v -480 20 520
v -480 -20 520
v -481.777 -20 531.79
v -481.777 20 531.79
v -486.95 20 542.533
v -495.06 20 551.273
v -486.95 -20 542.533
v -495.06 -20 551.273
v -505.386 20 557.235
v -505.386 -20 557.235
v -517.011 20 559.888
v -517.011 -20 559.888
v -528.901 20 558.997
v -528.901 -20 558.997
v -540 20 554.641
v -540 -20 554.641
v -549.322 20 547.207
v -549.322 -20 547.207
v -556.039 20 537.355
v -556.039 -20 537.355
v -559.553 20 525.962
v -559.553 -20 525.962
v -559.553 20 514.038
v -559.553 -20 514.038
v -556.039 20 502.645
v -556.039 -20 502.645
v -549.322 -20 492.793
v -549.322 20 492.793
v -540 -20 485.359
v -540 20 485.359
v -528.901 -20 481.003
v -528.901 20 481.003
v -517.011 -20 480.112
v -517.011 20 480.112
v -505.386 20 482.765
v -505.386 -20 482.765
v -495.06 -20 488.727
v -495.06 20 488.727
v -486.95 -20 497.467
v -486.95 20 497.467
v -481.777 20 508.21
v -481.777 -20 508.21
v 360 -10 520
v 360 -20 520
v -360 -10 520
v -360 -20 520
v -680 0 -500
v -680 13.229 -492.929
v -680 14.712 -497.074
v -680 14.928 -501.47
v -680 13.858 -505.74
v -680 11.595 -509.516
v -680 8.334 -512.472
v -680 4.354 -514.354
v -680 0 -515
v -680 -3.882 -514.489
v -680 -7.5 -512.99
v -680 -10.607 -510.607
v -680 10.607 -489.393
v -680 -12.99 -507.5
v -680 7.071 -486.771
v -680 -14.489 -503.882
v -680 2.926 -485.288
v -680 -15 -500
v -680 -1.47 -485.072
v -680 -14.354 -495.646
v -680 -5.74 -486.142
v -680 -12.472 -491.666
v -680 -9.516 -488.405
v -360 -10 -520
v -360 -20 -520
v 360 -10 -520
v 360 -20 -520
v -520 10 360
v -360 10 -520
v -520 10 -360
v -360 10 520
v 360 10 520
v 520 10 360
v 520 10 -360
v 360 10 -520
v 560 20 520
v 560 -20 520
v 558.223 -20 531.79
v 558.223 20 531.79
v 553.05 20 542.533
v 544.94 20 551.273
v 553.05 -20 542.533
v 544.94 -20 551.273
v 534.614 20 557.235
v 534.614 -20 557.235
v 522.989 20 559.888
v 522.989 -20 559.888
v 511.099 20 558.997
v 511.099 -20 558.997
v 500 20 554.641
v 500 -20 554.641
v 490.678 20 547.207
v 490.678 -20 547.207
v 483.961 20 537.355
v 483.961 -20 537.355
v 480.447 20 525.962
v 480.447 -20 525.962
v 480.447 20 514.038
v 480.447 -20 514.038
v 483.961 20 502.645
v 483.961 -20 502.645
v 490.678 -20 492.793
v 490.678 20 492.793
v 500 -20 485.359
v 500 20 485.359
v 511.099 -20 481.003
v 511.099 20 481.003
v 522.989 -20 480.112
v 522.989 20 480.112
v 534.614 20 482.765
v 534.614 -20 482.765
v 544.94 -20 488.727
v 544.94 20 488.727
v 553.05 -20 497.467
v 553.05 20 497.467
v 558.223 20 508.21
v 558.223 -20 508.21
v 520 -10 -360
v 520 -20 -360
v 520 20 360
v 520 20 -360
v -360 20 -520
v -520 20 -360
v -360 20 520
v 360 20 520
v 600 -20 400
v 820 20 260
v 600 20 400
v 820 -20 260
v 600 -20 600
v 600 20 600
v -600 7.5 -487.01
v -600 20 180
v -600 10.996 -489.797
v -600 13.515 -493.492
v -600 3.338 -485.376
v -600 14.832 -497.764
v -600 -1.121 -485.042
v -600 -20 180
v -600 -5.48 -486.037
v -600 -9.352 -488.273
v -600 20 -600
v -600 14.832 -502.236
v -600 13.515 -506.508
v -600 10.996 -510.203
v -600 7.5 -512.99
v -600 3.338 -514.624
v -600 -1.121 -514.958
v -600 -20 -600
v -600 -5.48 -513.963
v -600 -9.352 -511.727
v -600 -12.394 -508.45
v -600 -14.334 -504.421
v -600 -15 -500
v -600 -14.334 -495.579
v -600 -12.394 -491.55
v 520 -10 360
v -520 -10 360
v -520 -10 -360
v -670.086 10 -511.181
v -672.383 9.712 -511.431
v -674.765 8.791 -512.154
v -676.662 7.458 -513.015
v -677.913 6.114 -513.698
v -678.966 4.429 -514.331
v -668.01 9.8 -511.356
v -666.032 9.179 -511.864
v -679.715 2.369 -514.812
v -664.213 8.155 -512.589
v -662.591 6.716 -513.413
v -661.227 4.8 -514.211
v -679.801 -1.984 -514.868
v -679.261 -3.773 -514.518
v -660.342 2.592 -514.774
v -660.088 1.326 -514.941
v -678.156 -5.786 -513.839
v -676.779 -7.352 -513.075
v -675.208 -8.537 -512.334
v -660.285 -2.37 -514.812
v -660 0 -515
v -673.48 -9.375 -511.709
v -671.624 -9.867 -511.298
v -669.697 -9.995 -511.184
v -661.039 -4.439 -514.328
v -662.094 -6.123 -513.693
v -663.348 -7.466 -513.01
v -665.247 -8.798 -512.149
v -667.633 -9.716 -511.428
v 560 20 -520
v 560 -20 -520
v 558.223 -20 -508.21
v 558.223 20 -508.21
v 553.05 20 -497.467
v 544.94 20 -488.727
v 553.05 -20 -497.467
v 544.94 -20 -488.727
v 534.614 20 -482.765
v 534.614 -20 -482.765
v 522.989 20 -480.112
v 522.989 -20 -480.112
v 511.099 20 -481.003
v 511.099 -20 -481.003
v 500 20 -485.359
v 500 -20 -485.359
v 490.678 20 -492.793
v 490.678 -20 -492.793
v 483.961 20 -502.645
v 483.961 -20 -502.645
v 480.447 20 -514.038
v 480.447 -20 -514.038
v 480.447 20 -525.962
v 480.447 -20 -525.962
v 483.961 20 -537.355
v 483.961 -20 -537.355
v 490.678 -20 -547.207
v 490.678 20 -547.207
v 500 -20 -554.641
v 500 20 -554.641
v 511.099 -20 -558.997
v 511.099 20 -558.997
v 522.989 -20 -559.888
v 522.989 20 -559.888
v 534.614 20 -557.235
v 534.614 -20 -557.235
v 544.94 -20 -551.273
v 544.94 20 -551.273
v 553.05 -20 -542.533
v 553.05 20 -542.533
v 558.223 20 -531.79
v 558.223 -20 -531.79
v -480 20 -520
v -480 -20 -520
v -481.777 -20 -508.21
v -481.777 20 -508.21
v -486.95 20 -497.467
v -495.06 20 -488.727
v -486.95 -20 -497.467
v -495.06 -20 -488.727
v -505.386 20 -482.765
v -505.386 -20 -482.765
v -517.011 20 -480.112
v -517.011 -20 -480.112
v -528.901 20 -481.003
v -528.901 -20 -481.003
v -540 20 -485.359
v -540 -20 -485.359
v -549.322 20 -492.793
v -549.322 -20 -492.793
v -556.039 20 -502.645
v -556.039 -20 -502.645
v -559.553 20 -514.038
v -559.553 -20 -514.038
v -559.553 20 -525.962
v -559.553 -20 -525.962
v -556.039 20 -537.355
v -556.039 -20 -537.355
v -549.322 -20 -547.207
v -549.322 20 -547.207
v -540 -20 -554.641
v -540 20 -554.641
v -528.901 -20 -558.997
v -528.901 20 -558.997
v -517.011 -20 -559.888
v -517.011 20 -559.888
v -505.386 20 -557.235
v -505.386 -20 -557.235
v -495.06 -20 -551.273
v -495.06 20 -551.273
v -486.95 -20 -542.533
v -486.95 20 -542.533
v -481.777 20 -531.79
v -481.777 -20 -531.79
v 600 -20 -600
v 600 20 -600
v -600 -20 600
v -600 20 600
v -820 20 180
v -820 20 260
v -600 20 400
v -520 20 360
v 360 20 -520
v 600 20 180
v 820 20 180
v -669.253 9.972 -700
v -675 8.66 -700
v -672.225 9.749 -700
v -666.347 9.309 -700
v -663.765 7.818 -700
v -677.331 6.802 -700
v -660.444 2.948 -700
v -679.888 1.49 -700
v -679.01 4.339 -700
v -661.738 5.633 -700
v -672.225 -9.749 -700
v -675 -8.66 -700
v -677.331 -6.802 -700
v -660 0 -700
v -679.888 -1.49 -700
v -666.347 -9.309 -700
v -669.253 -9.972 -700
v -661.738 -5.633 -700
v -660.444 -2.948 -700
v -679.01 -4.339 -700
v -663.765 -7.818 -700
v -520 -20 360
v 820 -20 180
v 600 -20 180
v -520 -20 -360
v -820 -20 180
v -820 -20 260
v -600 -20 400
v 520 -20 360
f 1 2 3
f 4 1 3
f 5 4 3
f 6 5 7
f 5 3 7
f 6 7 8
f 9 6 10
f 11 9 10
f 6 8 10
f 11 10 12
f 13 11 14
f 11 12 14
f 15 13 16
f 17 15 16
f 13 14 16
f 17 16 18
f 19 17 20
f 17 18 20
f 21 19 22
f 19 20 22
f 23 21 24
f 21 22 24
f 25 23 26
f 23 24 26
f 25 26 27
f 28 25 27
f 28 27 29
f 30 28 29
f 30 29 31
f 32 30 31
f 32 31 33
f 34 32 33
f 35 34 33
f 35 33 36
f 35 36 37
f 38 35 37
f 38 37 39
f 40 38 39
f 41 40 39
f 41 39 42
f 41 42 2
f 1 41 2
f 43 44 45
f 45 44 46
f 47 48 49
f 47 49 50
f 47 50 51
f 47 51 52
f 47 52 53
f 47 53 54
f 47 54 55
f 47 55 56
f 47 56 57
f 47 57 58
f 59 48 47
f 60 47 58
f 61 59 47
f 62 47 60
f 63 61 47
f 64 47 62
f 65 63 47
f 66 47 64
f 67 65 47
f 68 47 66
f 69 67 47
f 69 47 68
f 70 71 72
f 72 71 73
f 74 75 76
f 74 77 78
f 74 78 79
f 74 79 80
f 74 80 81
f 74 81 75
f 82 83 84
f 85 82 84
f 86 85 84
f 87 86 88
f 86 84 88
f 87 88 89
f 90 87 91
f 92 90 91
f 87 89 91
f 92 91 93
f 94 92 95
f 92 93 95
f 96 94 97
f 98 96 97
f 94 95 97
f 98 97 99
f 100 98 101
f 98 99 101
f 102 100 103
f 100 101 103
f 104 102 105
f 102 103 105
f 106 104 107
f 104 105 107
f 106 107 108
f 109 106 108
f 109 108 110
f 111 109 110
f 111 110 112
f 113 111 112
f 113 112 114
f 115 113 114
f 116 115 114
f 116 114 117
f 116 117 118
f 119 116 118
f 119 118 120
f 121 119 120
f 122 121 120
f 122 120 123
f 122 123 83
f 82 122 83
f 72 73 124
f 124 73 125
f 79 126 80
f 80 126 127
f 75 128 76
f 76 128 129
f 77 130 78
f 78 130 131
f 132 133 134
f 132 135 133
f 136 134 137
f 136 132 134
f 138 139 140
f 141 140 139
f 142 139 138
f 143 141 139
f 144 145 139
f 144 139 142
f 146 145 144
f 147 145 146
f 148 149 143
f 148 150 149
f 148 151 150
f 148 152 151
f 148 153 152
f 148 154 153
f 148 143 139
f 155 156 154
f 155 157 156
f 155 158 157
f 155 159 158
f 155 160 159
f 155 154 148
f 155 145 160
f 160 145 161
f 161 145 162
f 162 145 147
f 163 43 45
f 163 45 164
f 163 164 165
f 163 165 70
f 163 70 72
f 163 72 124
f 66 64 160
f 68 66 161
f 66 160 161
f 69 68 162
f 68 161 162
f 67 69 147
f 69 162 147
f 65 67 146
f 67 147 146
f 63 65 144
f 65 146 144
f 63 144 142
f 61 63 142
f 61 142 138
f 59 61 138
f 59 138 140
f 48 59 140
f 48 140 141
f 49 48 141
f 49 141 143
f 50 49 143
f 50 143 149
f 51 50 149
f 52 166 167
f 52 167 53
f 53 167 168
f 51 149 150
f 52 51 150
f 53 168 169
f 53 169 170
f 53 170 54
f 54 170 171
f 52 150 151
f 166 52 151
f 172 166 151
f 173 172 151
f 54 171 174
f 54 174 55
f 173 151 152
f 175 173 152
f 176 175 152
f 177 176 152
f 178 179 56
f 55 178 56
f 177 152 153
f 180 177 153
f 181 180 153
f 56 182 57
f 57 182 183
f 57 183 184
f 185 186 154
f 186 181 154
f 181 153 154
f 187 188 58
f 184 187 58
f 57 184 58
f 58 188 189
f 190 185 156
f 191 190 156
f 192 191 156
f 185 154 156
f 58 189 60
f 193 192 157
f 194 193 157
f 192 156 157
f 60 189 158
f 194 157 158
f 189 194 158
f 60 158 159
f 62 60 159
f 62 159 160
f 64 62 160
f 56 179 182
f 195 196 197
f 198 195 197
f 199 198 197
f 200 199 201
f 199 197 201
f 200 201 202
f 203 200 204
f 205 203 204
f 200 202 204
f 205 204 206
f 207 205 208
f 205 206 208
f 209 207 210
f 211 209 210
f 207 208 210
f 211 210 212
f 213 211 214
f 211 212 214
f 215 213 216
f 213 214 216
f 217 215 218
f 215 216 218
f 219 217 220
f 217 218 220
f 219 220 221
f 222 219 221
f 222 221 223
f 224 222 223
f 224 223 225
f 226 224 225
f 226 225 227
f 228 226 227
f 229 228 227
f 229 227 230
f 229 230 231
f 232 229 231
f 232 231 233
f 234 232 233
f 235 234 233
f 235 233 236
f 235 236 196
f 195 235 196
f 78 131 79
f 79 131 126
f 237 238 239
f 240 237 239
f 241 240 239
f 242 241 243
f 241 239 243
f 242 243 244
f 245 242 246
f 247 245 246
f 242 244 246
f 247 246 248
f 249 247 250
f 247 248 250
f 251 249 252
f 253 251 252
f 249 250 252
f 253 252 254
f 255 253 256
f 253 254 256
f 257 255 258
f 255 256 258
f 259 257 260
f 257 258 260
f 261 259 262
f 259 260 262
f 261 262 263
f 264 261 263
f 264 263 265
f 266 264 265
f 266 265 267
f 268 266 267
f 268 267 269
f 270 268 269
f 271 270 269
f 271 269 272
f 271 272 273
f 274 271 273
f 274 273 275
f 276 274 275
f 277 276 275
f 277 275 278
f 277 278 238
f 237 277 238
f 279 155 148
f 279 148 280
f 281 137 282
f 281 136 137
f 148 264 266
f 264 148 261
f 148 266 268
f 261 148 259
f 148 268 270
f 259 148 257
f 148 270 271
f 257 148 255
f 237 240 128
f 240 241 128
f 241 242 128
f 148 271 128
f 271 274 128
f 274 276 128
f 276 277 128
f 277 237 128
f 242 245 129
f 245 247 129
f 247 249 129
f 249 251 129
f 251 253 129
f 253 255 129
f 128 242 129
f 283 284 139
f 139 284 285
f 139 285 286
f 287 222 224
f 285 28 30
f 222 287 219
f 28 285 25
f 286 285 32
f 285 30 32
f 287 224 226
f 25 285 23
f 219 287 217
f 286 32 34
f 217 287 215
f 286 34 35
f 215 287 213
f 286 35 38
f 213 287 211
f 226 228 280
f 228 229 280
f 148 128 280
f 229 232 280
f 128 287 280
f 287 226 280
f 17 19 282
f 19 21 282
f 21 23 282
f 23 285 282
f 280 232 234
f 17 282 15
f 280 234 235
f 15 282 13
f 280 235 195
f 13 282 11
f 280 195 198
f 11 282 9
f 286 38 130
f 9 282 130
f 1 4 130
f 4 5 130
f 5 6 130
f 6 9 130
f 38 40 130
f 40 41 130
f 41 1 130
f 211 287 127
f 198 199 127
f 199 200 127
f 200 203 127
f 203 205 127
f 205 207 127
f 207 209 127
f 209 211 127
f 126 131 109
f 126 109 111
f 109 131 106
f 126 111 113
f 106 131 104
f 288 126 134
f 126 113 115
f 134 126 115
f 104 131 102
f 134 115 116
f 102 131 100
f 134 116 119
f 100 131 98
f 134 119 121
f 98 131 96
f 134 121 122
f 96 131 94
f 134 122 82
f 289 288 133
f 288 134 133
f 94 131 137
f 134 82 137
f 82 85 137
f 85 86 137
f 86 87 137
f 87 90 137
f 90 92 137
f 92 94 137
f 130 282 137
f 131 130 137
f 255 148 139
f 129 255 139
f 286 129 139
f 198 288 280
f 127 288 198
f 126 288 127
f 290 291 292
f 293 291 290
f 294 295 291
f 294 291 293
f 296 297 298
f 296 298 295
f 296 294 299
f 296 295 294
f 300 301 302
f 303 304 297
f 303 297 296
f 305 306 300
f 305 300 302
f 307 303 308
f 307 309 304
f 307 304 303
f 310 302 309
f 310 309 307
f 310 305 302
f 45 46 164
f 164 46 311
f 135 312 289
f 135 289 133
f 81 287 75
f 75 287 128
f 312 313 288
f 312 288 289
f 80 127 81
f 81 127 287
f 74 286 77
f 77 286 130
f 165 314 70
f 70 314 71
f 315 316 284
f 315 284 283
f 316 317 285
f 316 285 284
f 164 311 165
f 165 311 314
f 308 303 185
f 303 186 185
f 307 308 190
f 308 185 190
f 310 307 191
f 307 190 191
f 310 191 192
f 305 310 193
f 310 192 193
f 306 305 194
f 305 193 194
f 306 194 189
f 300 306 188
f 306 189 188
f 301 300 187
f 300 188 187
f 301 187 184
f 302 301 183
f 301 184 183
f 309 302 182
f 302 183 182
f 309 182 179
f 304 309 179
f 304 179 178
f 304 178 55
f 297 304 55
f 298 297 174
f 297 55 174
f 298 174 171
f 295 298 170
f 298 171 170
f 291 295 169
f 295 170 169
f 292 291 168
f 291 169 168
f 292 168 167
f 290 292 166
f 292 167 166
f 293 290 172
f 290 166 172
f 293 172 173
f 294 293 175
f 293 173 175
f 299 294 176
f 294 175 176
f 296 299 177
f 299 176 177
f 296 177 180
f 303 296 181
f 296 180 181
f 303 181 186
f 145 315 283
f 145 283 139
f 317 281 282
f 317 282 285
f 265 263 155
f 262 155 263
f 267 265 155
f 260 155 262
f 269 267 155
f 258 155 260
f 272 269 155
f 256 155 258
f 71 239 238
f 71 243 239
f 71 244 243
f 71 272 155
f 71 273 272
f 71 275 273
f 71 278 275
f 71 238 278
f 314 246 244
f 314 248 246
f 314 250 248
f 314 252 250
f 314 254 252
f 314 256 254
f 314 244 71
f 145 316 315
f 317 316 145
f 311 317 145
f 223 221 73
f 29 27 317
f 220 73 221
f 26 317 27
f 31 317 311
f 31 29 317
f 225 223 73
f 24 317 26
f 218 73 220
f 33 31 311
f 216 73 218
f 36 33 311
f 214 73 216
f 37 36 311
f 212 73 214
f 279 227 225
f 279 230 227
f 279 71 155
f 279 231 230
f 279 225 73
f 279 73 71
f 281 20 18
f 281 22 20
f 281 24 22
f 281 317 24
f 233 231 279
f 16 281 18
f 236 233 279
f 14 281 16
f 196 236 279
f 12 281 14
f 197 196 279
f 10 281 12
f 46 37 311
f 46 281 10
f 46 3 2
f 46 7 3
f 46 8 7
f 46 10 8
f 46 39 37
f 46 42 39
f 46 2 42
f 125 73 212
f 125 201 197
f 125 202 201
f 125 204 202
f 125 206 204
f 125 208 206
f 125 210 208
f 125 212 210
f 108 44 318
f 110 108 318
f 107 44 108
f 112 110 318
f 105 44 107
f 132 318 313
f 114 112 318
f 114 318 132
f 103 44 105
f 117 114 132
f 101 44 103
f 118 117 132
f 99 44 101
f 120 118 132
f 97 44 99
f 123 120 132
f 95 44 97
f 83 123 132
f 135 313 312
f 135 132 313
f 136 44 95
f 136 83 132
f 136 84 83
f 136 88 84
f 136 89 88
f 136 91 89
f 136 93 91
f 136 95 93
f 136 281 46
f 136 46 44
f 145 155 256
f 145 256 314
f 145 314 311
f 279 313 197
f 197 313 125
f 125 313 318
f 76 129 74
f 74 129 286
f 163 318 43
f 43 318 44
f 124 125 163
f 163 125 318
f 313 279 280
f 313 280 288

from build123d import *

# Parameters (mm, degrees)
F1_DEPTH       = 20
F2_R           = 40
F3_DEPTH       = 50
F5_DEPTH       = 10
F7_DEPTH       = 10
F8_R           = 15
F9_DEPTH       = 80
F10_R          = 10
F11_DEPTH      = 100
F11_DEPTH_BACK = 100


with BuildPart() as f1:
    # F0 (on Front) → F1 (new body, symmetric)
    with BuildSketch(Plane.XZ):
        Polygon((600, 600), (-600, 600), (-600, 400), (-600, 180), (-600, -600), (600, -600), (600, 180), (600, 400), align=None)
        Polygon((-600, 180), (-600, 400), (-820, 260), (-820, 180), align=None)
        Polygon((820, 260), (600, 400), (600, 180), (820, 180), align=None)
    extrude(amount=F1_DEPTH, both=True)

    # F2 (on face) → F3 (cut)
    with BuildSketch(Plane.XZ.offset(20)):
        with Locations((-520, 520)):
            Circle(F2_R)
        with Locations((-520, -520)):
            Circle(F2_R)
        with Locations((520, 520)):
            Circle(F2_R)
        with Locations((520, -520)):
            Circle(F2_R)
    extrude(amount=-F3_DEPTH, mode=Mode.SUBTRACT)

    # F4 (on face) → F5 (cut)
    with BuildSketch(Plane.XZ.offset(20)):
        Polygon((360, 520), (-360, 520), (-520, 360), (-520, -360), (-360, -520), (360, -520), (520, -360), (520, 360), align=None)
    extrude(amount=-F5_DEPTH, mode=Mode.SUBTRACT)

    # F6 (on face) → F7 (cut)
    with BuildSketch(Plane(origin=(0, 20, 0), x_dir=(-1, 0, 0), z_dir=(0, 1, 0))):
        Polygon((360, -520), (520, -360), (520, 360), (360, 520), (-360, 520), (-520, 360), (-520, -360), (-360, -520), align=None)
    extrude(amount=-F7_DEPTH, mode=Mode.SUBTRACT)

    # F8 (on face) → F9 (join)
    with BuildSketch(Plane(origin=(-600, 0, 0), x_dir=(0, -1, 0), z_dir=(-1, 0, 0))):
        with Locations((0, -500)):
            Circle(F8_R)
    extrude(amount=F9_DEPTH)

    # F10 (on face) → F11 (join, two sides)
    with BuildSketch(Plane(origin=(0, 0, -600), x_dir=(1, 0, 0), z_dir=(0, 0, -1))) as f11_sk:
        with Locations((-670, 0)):
            Circle(F10_R)
    extrude(amount=-F11_DEPTH)
    extrude(f11_sk.sketch, amount=F11_DEPTH_BACK)


solid = f1.part
